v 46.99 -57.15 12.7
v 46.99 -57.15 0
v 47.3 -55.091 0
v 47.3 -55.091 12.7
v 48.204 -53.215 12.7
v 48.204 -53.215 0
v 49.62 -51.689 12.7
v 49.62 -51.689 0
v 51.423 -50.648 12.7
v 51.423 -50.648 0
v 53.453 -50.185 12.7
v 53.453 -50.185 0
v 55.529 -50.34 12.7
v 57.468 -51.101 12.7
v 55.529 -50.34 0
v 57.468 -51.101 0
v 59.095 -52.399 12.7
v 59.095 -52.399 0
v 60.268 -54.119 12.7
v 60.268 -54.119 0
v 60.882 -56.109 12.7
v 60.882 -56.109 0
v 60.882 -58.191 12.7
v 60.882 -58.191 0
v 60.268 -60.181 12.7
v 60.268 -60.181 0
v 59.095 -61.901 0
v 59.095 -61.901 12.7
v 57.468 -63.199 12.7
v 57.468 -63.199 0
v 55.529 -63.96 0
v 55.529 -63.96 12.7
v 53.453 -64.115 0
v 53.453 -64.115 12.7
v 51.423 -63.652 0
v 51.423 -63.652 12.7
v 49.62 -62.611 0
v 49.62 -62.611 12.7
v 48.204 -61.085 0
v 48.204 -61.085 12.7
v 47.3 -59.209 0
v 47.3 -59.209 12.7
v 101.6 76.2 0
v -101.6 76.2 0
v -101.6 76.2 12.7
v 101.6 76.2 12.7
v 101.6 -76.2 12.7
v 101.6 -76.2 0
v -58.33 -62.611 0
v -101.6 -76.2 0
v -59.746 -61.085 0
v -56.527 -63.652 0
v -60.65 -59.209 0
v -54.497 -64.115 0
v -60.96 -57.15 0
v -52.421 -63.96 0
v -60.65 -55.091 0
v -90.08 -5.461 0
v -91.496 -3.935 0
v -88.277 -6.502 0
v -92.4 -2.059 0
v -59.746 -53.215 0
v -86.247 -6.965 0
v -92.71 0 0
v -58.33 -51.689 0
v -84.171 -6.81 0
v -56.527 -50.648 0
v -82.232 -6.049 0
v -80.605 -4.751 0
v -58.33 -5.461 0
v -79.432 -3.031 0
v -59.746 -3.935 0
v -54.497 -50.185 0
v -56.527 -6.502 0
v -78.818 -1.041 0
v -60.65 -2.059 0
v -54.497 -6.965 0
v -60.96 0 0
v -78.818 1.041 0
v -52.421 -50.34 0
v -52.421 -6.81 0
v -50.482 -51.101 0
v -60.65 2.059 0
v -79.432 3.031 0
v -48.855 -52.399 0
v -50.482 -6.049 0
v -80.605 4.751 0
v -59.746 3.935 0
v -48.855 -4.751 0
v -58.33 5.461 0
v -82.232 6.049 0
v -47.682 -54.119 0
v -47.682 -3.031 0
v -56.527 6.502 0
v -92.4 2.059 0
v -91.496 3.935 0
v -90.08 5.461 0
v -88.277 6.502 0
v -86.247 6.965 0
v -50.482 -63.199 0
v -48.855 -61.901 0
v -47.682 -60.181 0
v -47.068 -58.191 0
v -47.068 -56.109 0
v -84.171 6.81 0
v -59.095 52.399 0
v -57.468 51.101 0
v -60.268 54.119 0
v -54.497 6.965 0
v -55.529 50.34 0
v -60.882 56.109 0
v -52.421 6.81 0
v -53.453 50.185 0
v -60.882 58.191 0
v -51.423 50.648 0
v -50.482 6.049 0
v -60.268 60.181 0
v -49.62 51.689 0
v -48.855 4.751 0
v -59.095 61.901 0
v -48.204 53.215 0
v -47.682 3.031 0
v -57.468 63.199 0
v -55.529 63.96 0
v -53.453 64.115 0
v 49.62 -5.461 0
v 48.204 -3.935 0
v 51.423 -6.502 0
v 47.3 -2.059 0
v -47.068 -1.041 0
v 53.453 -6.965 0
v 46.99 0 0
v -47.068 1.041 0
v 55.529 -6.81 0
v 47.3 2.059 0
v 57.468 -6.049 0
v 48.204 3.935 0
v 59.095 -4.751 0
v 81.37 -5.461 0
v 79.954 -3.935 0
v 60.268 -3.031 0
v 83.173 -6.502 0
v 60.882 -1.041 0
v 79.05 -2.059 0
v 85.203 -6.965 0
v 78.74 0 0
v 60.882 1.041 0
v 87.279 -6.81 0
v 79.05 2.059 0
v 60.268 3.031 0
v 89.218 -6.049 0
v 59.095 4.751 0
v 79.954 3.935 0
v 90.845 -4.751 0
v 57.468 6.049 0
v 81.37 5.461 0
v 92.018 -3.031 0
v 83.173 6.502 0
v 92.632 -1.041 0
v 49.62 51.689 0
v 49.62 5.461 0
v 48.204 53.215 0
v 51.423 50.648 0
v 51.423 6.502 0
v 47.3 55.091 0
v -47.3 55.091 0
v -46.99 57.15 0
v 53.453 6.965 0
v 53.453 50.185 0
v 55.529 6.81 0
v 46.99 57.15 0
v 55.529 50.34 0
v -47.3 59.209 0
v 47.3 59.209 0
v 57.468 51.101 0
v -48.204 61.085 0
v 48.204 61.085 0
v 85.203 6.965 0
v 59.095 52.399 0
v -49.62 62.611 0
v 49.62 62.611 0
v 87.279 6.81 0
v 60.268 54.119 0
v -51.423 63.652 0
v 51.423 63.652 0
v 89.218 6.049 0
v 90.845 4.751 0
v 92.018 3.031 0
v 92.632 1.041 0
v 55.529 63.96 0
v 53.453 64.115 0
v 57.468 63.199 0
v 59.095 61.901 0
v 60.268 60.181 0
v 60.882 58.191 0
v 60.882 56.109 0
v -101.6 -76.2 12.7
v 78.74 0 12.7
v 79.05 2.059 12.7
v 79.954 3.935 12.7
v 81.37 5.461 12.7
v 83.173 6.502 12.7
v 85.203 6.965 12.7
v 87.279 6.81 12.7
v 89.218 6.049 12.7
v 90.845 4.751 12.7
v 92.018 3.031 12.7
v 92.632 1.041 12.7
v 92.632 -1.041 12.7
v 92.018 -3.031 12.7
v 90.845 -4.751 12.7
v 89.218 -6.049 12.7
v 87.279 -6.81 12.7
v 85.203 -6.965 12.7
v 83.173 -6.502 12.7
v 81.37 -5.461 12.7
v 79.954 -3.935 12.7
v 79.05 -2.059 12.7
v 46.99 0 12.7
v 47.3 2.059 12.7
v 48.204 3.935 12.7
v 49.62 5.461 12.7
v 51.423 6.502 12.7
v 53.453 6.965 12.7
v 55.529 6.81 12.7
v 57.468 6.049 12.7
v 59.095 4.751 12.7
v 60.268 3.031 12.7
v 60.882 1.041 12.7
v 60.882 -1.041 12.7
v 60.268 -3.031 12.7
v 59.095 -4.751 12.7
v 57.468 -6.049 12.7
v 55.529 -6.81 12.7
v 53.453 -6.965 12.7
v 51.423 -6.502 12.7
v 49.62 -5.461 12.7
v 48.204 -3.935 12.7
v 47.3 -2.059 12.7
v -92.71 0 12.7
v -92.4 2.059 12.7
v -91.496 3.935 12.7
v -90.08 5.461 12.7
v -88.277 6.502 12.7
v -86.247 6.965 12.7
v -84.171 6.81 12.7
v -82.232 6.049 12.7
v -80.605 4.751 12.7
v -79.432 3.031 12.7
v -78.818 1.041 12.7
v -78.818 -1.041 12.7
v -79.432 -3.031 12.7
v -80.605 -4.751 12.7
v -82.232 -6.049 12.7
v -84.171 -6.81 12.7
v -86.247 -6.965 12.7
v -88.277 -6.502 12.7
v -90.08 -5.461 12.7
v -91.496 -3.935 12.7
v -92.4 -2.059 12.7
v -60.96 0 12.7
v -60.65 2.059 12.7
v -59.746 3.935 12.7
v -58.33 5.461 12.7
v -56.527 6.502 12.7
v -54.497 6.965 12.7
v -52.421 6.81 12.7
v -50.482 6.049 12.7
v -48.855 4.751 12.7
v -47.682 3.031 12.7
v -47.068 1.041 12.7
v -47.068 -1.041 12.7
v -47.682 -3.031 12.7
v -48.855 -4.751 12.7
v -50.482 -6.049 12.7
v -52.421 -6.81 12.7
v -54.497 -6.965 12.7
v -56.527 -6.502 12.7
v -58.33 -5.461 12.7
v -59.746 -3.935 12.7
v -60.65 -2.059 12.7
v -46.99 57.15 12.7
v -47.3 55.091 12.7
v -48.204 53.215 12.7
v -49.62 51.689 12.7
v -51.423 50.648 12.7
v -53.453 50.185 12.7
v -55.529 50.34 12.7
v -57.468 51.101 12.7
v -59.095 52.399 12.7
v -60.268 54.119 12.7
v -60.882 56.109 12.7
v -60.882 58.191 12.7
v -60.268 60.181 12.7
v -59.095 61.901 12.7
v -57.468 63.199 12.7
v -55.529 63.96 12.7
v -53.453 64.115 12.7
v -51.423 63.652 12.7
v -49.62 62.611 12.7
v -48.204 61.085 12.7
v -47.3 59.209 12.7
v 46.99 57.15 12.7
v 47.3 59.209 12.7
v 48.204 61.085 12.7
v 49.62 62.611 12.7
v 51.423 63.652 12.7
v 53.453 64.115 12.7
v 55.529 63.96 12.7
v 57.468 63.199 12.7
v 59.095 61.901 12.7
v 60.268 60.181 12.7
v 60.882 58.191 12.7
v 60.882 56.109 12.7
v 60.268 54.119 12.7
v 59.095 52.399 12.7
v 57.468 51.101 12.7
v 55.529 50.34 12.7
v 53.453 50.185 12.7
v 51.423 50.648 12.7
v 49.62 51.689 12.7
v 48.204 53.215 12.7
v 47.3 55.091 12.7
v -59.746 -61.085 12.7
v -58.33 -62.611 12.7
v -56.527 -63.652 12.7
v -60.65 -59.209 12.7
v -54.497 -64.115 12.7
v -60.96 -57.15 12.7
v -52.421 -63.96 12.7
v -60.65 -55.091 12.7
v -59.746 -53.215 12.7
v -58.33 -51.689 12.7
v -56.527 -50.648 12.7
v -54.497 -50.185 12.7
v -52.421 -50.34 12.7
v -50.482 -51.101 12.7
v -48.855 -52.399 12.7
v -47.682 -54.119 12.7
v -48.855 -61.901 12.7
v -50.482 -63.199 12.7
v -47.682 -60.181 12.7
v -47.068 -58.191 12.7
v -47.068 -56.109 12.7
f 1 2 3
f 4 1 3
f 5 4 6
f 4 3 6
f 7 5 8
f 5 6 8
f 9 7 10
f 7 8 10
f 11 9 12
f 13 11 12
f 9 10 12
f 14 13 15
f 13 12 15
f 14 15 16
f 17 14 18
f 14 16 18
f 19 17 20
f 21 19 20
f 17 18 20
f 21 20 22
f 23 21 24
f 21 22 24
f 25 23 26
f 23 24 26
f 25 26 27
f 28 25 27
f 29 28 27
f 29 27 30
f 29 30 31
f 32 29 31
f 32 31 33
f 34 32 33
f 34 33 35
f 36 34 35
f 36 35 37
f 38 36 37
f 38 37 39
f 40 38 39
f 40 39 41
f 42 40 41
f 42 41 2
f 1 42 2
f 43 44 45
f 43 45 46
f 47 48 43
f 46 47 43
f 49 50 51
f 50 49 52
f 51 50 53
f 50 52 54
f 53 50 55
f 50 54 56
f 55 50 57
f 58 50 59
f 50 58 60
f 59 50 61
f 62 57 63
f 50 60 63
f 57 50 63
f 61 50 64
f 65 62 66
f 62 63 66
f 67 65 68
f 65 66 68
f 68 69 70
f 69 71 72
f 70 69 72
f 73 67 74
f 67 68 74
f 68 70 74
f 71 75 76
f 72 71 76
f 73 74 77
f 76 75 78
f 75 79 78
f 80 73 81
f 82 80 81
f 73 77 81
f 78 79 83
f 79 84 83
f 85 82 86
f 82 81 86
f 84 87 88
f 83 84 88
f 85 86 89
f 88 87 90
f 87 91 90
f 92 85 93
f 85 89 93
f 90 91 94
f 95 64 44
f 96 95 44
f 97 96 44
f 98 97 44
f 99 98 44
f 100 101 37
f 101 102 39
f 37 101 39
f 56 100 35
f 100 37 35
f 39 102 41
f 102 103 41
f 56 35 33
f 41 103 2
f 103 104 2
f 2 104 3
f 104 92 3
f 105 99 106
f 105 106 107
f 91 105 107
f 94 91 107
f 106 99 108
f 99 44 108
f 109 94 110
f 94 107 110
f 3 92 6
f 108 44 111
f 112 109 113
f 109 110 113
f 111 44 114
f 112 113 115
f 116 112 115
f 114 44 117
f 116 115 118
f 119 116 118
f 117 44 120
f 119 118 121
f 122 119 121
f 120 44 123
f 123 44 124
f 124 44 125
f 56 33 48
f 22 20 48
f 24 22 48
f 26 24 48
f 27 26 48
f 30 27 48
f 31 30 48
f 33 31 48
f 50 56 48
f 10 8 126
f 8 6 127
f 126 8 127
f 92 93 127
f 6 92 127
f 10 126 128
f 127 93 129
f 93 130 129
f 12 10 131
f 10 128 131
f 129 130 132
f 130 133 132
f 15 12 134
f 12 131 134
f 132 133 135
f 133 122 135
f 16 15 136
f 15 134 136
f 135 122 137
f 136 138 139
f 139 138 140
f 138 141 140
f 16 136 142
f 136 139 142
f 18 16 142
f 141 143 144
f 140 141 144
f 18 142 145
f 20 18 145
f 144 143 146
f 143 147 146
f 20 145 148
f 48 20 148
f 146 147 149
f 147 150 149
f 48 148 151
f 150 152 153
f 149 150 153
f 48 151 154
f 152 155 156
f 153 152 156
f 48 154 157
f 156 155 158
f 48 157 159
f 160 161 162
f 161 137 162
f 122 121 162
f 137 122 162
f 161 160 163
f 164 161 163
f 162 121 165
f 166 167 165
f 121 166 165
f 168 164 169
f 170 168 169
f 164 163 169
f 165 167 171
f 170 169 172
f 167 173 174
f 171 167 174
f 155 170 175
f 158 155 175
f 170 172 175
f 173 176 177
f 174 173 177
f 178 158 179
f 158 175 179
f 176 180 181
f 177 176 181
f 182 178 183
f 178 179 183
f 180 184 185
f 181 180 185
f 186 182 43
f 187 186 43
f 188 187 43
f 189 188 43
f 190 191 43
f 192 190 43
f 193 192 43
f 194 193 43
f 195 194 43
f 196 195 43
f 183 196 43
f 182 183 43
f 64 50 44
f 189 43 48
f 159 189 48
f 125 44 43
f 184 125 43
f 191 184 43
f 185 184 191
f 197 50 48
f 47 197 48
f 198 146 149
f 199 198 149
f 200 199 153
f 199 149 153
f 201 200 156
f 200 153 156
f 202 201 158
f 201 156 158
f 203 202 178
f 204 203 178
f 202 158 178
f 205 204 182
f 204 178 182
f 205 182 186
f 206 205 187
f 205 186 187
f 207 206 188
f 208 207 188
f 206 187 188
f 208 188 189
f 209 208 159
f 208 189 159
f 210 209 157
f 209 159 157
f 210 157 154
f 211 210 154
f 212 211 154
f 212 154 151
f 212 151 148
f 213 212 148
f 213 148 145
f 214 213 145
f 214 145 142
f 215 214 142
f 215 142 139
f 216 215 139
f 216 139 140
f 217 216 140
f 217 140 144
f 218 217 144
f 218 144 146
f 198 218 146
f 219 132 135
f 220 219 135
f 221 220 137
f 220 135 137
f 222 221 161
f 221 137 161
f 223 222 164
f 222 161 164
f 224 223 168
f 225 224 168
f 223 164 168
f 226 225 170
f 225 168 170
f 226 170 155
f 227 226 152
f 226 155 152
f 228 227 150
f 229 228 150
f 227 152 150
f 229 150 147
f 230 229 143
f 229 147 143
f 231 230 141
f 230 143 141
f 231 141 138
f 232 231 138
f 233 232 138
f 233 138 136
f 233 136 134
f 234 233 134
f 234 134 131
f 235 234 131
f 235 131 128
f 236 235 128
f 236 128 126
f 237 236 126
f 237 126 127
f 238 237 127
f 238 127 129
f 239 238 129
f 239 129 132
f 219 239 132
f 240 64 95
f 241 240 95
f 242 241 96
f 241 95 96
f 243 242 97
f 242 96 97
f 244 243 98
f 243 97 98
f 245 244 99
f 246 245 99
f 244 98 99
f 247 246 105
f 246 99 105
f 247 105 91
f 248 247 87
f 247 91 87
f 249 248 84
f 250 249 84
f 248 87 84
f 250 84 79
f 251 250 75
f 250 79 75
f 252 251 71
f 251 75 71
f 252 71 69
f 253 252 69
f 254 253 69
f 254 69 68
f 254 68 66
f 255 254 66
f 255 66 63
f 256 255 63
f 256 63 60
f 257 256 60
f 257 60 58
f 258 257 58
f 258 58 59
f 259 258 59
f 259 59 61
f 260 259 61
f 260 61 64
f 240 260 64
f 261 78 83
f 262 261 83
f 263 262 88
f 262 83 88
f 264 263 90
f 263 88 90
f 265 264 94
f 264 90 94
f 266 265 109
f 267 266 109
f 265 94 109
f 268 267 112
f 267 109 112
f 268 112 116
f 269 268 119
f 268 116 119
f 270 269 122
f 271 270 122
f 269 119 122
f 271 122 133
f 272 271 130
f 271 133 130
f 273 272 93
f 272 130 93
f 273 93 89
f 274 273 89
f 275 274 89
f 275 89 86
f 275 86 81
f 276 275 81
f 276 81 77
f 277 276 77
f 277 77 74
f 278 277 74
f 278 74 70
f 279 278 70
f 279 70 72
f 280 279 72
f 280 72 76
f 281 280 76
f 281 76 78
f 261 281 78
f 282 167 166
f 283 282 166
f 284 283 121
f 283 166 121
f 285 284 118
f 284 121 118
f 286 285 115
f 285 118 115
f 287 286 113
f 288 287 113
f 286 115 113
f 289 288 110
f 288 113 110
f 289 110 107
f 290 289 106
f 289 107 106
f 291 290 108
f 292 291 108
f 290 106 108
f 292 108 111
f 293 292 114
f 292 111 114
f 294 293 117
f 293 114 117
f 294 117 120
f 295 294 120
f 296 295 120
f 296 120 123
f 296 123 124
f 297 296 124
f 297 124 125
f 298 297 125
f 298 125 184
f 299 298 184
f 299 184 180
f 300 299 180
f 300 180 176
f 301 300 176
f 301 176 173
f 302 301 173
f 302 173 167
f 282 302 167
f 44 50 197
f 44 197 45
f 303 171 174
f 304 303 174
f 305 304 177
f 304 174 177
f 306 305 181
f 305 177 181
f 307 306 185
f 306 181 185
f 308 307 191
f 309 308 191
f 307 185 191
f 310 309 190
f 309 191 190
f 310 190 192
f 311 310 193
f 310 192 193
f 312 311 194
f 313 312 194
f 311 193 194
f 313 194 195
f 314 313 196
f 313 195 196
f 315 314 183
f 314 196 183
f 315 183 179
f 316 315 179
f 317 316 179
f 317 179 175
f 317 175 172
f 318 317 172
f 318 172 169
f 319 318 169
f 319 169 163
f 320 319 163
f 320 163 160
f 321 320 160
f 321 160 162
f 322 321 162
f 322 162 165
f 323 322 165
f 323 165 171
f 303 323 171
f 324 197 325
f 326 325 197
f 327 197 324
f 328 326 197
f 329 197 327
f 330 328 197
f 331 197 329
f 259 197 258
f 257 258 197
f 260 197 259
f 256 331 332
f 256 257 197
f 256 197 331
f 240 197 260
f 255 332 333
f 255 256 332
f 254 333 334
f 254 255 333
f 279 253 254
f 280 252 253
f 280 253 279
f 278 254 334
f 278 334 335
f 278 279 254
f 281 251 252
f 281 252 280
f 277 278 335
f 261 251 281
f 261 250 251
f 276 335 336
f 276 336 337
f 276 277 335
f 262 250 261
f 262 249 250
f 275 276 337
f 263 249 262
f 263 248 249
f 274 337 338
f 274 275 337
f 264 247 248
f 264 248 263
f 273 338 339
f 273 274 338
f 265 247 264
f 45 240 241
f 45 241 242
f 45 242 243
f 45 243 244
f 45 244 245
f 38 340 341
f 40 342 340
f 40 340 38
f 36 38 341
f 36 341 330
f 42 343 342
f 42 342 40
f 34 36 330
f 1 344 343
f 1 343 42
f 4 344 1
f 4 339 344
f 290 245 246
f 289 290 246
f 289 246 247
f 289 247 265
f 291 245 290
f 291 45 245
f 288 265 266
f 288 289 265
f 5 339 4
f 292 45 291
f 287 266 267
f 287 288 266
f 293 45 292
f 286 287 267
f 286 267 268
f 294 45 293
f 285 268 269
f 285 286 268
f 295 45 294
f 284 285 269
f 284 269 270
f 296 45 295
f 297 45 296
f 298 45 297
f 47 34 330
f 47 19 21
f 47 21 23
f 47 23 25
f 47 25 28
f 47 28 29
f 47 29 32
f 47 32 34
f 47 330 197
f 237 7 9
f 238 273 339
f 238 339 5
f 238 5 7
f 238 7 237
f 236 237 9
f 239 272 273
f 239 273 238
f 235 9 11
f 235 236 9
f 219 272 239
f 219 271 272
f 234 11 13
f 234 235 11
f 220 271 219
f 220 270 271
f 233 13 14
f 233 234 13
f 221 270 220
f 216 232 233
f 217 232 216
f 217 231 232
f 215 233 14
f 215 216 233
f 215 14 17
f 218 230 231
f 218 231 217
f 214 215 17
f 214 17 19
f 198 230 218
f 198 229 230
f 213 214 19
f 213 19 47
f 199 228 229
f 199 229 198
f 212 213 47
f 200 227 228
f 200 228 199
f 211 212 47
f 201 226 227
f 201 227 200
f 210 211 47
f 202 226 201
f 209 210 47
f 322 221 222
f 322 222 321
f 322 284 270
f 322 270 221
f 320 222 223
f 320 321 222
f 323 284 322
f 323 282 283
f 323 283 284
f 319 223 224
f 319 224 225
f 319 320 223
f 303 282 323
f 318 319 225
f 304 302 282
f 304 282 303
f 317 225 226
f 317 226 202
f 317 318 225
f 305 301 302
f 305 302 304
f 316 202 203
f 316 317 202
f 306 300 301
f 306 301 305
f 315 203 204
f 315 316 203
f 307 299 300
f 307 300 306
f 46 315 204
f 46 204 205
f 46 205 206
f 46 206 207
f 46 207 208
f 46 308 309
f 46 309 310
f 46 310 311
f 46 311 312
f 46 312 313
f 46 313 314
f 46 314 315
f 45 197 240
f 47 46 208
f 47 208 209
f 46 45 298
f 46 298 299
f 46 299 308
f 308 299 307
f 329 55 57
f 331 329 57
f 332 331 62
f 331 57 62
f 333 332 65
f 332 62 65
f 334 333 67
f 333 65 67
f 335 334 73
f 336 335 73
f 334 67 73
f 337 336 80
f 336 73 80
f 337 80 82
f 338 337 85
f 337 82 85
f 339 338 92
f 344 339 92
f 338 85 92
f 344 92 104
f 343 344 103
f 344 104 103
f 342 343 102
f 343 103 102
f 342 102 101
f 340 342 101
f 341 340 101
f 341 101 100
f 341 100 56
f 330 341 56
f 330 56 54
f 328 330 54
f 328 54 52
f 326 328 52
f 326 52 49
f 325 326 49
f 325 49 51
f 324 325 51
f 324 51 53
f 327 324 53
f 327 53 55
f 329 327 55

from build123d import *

# Parameters (mm, degrees)
SKETCH2_W           = 203.2
SKETCH2_H           = 152.4
BOSS_EXTRUDE1_DEPTH = 12.7
SKETCH3_R           = 6.985
CUT_EXTRUDE1_DEPTH  = 128.633420388


with BuildPart() as part:
    # Sketch2 → Boss-Extrude1 (new body)
    with BuildSketch(Plane.XY):
        Rectangle(SKETCH2_W, SKETCH2_H)
    extrude(amount=BOSS_EXTRUDE1_DEPTH)

    # Sketch3 → Cut-Extrude1 (cut, through all)
    with BuildSketch(Plane(origin=(0, 0, 0), x_dir=(-1, 0, 0), z_dir=(0, 0, -1))):
        with Locations((53.975, 0)):
            Circle(SKETCH3_R)
        with Locations((85.725, 0)):
            Circle(SKETCH3_R)
        with Locations((53.975, -57.15)):
            Circle(SKETCH3_R)
        with Locations((-53.975, 0)):
            Circle(SKETCH3_R)
        with Locations(Location((53.975, 57.15, 0), (0, 0, 180))):
            Circle(SKETCH3_R)
        with Locations((-53.975, -57.15)):
            Circle(SKETCH3_R)
        with Locations((-85.725, 0)):
            Circle(SKETCH3_R)
        with Locations((-53.975, 57.15)):
            Circle(SKETCH3_R)
    extrude(amount=-CUT_EXTRUDE1_DEPTH, mode=Mode.SUBTRACT)


solid = part.part
